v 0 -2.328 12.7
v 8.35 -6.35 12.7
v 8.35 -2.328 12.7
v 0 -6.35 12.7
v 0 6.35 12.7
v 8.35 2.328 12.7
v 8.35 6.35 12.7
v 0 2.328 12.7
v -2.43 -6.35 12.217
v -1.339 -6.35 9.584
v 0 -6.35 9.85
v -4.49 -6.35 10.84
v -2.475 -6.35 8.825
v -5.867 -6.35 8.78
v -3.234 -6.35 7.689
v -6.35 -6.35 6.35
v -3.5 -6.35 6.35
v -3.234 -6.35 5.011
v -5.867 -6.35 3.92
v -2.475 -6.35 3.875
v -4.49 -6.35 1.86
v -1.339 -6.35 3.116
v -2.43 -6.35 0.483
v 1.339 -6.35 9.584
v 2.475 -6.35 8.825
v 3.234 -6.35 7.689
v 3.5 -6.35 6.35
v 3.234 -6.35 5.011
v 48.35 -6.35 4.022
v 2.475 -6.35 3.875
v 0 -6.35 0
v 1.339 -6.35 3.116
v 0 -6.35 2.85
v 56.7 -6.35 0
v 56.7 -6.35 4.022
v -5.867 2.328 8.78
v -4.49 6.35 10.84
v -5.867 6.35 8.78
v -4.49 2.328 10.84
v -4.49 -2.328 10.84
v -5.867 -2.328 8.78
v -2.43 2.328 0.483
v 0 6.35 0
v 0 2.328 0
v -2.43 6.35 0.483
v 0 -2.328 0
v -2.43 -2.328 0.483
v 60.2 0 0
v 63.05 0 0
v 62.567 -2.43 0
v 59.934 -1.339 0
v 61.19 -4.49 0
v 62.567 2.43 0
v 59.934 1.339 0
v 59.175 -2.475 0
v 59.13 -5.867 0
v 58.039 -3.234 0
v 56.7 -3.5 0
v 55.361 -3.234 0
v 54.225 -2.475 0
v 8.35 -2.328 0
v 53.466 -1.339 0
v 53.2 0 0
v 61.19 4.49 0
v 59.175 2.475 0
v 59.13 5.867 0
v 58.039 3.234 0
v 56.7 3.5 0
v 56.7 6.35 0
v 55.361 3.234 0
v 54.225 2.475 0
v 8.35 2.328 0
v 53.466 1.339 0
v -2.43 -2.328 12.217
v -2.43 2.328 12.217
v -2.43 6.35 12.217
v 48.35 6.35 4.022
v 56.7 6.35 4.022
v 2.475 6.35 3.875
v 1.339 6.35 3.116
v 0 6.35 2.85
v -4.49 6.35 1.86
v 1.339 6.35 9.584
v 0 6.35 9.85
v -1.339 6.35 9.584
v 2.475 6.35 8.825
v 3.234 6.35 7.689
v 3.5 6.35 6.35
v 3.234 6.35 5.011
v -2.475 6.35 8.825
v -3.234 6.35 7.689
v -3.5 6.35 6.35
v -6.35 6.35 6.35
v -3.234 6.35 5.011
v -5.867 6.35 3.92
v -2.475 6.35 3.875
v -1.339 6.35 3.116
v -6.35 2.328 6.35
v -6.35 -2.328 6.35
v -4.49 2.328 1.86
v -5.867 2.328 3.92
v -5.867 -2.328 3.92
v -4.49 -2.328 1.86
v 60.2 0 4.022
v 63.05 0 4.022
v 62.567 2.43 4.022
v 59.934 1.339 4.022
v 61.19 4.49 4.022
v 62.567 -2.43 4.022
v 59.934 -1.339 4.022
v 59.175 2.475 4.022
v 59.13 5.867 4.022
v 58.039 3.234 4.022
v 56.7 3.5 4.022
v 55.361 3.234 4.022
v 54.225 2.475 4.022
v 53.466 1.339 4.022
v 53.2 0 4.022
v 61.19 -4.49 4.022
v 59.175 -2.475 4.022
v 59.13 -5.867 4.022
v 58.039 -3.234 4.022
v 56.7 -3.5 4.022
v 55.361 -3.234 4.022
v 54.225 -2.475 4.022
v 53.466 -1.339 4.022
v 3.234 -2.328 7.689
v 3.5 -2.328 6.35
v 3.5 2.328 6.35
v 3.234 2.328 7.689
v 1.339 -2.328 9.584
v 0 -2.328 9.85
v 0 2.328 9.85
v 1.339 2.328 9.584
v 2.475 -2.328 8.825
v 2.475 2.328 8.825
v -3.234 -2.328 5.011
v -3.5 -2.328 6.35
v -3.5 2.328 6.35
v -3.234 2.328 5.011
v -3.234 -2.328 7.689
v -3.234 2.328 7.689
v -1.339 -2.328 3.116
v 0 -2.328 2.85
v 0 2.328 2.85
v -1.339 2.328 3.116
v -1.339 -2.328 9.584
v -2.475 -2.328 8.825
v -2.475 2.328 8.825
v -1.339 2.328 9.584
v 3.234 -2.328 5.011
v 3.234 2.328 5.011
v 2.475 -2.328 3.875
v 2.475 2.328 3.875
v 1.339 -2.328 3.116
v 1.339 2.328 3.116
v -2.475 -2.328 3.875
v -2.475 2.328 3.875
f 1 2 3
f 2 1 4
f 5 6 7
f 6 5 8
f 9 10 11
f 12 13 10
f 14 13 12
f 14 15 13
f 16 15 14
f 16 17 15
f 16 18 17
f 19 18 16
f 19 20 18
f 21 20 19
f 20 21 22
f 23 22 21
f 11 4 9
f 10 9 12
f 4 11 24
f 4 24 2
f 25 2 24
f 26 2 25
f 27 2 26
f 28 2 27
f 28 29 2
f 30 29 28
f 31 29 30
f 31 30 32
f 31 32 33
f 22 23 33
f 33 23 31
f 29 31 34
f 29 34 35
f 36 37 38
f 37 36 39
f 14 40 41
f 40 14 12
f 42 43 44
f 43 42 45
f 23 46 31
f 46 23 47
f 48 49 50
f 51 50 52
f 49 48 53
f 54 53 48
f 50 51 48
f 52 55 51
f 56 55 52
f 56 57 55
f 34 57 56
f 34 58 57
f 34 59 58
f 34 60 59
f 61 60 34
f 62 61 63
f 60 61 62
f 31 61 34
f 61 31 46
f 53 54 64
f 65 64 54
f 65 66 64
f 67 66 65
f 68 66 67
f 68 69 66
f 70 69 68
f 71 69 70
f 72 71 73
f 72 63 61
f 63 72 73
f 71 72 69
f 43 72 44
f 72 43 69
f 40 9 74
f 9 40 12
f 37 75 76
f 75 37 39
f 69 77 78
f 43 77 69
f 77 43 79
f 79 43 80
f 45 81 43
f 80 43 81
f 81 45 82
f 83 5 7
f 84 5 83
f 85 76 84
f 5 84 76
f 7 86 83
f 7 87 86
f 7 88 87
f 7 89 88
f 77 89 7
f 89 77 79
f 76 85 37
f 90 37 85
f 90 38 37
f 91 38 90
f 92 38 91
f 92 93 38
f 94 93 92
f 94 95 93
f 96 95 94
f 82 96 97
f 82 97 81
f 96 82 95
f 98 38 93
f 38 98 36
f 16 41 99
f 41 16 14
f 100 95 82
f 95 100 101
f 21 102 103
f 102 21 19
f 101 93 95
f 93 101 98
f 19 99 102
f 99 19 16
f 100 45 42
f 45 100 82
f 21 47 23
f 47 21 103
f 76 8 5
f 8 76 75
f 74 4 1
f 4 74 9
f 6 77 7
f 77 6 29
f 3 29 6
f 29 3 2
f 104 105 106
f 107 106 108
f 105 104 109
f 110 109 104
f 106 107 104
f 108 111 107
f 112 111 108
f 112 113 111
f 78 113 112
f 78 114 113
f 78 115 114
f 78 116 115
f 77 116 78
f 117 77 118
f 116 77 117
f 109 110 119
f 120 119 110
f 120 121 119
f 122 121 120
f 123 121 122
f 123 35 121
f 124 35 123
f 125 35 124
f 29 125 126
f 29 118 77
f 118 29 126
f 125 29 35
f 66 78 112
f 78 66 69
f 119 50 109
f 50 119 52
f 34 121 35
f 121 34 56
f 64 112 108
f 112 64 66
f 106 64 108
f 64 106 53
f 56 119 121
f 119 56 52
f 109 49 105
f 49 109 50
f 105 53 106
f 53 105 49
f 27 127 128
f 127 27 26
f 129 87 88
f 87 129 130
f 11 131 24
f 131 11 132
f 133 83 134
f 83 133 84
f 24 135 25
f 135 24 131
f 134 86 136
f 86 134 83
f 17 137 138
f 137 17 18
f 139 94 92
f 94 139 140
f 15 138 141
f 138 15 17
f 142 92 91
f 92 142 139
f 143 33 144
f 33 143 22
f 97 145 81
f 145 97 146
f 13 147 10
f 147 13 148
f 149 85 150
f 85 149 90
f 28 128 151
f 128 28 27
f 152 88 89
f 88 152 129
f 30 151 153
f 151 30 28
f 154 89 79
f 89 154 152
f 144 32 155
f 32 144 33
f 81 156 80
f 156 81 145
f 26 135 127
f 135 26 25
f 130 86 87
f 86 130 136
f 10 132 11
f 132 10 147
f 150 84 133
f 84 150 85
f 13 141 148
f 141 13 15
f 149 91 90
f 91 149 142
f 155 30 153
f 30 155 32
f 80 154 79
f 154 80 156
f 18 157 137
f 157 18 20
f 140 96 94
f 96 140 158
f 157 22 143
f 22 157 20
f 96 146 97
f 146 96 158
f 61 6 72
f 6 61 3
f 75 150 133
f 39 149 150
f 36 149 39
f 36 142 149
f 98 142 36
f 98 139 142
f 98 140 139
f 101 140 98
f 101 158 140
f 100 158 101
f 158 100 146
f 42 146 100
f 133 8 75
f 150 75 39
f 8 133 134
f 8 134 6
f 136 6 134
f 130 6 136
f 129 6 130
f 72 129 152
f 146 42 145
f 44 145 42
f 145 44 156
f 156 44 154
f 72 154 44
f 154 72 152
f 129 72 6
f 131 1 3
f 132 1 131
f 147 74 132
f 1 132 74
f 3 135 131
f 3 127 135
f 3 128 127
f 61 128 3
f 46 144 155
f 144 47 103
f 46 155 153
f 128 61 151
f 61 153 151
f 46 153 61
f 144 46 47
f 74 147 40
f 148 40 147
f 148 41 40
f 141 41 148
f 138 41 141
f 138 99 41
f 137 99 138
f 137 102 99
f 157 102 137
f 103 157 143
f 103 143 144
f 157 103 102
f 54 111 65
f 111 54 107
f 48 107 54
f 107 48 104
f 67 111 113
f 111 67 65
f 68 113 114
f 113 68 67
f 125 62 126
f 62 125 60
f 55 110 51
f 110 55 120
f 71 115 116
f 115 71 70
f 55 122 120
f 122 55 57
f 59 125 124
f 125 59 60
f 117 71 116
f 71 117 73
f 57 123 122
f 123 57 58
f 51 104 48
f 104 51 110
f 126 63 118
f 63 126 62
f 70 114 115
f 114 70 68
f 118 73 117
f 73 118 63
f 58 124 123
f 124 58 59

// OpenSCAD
//use <tyler.scad>;

/**
 * Linkos: by Tyler Bletsch (Tyler.Bletsch@gmail.com)
 */
 
// preview[view:south west, tilt:top diagonal]

$fn=16*1;

E=0.05*1;
inch = 25.4*1;

/* [Global] */

// Type of link to show: LINK mates to another link, PLATE_HORIZONTAL and PLATE_VERTICAL are used to mount to whatever object you're messing with. 
part = "LINK"; // [LINK, PLATE_HORIZONTAL, PLATE_VERTICAL]

/* [General] */

// Length of the link, excluding the mounting stuff at the ends (mm)
link_len = 40;

// Diameter of the hole used in linkages (mm). I like to use 1/4-20 bolts, so I set this to 0.25" with a 10% margin, or about 7mm.
link_hole_dia = 7; 
/// (0.25*inch*1.10)

// Thickness of the link (mm). For a nice look, make this bolt_length-nut_thickness. For example, you can use 3/4" bolts with 1/4"-thick nuts by setting this to 1/2" (12.7mm). This variable is forced to be at least 50% greater than link_hole_dia for strength.
thickness_ = 12.7;
thickness = max(link_hole_dia*1.5,thickness_);

// Extra margin on the side of the link to allow for clean swiveling (mm).
tab_extra = 2;

// How much to loosen the fit of the links (%).
layer_tolerance_percent = 5; // [0:25]

layer = thickness/3 * (1 - layer_tolerance_percent/100);

/* [Horizontal plate] */

// Diameter for mounting holes on the horizontal plate (mm). 4.4mm works for #8 screws.
hplate_hole_dia = 4.4;

// Number of holes in the X direction
hplate_num_holes_x = 2; // [1:4]

// Number of holes in the Y direction
hplate_num_holes_y = 2; // [1:4]

// Thickness of the horizontal plate (mm)
hplate_thickness = 2;

// Rounding radius of the plate corners (mm)
hplate_corner_radius = 2;

// Optional: you can boost the plate width irrespective of the holes here (mm)
hplate_extra_width = 0; 

// Optional: you can boost the plate height irrespective of the holes here (mm)
hplate_extra_height = 0;

hplate_width = 3*hplate_hole_dia*hplate_num_holes_x + hplate_extra_width;
hplate_height= 3*hplate_hole_dia*hplate_num_holes_y + hplate_extra_height;


/* [Vertical plate] */

// Diameter for mounting holes on the vertical plate (mm). 4.4mm works for #8 screws.
vplate_hole_dia = 4.4;

// Number of holes in the Y direction
vplate_num_holes_y = 1; // [1:4]

// Number of holes in the Z direction
vplate_num_holes_z = 3; // [1:4]

// Thickness of the plate (mm)
vplate_thickness = 3;

// Optional: you can boost the plate width irrespective of the holes here (mm)
vplate_extra_width = 0;

// Optional: you can boost the plate height irrespective of the holes here (mm)
vplate_extra_height = 0;

vplate_width =(3*vplate_num_holes_y)*vplate_hole_dia+vplate_extra_width;
vplate_height=(3*vplate_num_holes_z)*vplate_hole_dia+vplate_extra_height;

// hull each child in a row, one after another -- makes a "snake" of the given forms
module hull_chain() {
    for (i = [1:$children-1]) {
        hull() children([i-1:i]);
    }
}

left_center_x  = 0*0;
left_tab_start_x = left_center_x+thickness/2+tab_extra;
right_center_x = thickness/2+tab_extra+link_len+tab_extra+thickness/2;
right_tab_start_x = right_center_x-thickness/2-tab_extra;

difference() {
    if (part=="LINK") {
        hull_chain() {
            translate([left_center_x,0,thickness/2]) rotate([90]) cylinder(d=thickness, h=thickness, center=true);
            translate([left_tab_start_x,0]) cube2([E,thickness,thickness],aligns="RCL");
            translate([right_tab_start_x,0]) cube2([E,thickness,layer],aligns="RCL");
            translate([right_center_x,0]) cylinder(d=thickness, h=layer, center=false);
        }
    } else if (part=="PLATE_HORIZONTAL") {
        hull_chain() {
            translate([left_center_x,0,thickness/2]) rotate([90]) cylinder(d=thickness, h=thickness, center=true);
            translate([left_tab_start_x,0]) cube2([E,thickness,thickness],aligns="RCL");
            translate([right_tab_start_x,0]) cube2([E,hplate_height,hplate_thickness],aligns="RCL");
            translate([right_tab_start_x,0]) cube2([hplate_width,hplate_height,hplate_thickness],xy_radius=hplate_corner_radius, aligns="LCL");
        }
    } else if (part=="PLATE_VERTICAL") {
        hull_chain() {
            translate([left_center_x,0,thickness/2]) rotate([90]) cylinder(d=thickness, h=thickness, center=true);
            translate([left_tab_start_x,0]) cube2([E,thickness,thickness],aligns="RCL");
            translate([right_tab_start_x,0]) cube2([E,vplate_width,thickness],aligns="RCL");
        }
        translate([right_tab_start_x,0]) cube2([vplate_thickness,vplate_width,thickness+vplate_height],aligns="LCL");
    }

    // left hole
    translate([0,0,thickness/2]) rotate([90]) cylinder(d=link_hole_dia,h=thickness+E,center=true); 
    
    // left cutout (to make two tabs)
    translate([0,0,-E]) cube2([2*(thickness/2+tab_extra),thickness-2*layer,thickness+2*E],aligns="CCL");

    // right hole
    if (part=="LINK") {
        translate([right_center_x,0]) cylinder(d=link_hole_dia, h=thickness+E, center=true);
    } else if (part=="PLATE_HORIZONTAL") {
        if (hplate_hole_dia && hplate_num_holes_x && hplate_num_holes_y) {
            translate([right_tab_start_x,0,-E]) {
                for (i = [0:hplate_num_holes_x-1]) for (j = [0:hplate_num_holes_y-1]) {
                    x = hplate_hole_dia*(1.5+3*i);
                    y = hplate_hole_dia*(1.5+3*(j-hplate_num_holes_y/2));
                    translate([x,y,0]) cylinder(d=hplate_hole_dia,h=hplate_thickness+2*E);
                }
            }
        }
    } else if (part=="PLATE_VERTICAL") {
        if (vplate_hole_dia && vplate_num_holes_y && vplate_num_holes_z) {
            translate([right_tab_start_x-E,0]) {
                for (i = [0:vplate_num_holes_y-1]) for (j = [0:vplate_num_holes_z-1]) {
                    echo(i,j);
                    y = vplate_hole_dia*(1.5+3*(i-vplate_num_holes_y/2));
                    z = vplate_hole_dia*(1.5+3*j) + thickness;
                    translate([0,y,z]) rotate([0,90]) cylinder(d=vplate_hole_dia,h=vplate_width+2*E);
                }
            }
        }
    }
    
}


module cube2(size,aligns="LLL",radius=0,xy_radius=0) {
    real_size = len(size) ? size : [size,size,size];
    tr = [
        aligns[0]=="C" ? 0 : aligns[0]=="R" ? (-real_size[0]/2) : (+real_size[0]/2),
        aligns[1]=="C" ? 0 : aligns[1]=="R" ? (-real_size[1]/2) : (+real_size[1]/2),
        aligns[2]=="C" ? 0 : aligns[2]=="R" ? (-real_size[2]/2) : (+real_size[2]/2)
    ];
    translate(tr) {
        if (xy_radius>0) {
            inner_size = [for (v=real_size) v-min(xy_radius*2,v)];
            linear_extrude(real_size[2], center=true) offset(r=xy_radius) square([inner_size[0],inner_size[1]], center=true);
        } else if (radius>0) {
            if (radius*2 >= max(real_size)) {
                resize(real_size) sphere(1);
            } else {
                inner_size = [for (v=real_size) v-min(radius*2,v)];
                minkowski() {
                    cube(inner_size,center=true);
                    sphere(r=radius);
                }
            }
        } else {
            cube(real_size,center=true);
        }
    } 
}
